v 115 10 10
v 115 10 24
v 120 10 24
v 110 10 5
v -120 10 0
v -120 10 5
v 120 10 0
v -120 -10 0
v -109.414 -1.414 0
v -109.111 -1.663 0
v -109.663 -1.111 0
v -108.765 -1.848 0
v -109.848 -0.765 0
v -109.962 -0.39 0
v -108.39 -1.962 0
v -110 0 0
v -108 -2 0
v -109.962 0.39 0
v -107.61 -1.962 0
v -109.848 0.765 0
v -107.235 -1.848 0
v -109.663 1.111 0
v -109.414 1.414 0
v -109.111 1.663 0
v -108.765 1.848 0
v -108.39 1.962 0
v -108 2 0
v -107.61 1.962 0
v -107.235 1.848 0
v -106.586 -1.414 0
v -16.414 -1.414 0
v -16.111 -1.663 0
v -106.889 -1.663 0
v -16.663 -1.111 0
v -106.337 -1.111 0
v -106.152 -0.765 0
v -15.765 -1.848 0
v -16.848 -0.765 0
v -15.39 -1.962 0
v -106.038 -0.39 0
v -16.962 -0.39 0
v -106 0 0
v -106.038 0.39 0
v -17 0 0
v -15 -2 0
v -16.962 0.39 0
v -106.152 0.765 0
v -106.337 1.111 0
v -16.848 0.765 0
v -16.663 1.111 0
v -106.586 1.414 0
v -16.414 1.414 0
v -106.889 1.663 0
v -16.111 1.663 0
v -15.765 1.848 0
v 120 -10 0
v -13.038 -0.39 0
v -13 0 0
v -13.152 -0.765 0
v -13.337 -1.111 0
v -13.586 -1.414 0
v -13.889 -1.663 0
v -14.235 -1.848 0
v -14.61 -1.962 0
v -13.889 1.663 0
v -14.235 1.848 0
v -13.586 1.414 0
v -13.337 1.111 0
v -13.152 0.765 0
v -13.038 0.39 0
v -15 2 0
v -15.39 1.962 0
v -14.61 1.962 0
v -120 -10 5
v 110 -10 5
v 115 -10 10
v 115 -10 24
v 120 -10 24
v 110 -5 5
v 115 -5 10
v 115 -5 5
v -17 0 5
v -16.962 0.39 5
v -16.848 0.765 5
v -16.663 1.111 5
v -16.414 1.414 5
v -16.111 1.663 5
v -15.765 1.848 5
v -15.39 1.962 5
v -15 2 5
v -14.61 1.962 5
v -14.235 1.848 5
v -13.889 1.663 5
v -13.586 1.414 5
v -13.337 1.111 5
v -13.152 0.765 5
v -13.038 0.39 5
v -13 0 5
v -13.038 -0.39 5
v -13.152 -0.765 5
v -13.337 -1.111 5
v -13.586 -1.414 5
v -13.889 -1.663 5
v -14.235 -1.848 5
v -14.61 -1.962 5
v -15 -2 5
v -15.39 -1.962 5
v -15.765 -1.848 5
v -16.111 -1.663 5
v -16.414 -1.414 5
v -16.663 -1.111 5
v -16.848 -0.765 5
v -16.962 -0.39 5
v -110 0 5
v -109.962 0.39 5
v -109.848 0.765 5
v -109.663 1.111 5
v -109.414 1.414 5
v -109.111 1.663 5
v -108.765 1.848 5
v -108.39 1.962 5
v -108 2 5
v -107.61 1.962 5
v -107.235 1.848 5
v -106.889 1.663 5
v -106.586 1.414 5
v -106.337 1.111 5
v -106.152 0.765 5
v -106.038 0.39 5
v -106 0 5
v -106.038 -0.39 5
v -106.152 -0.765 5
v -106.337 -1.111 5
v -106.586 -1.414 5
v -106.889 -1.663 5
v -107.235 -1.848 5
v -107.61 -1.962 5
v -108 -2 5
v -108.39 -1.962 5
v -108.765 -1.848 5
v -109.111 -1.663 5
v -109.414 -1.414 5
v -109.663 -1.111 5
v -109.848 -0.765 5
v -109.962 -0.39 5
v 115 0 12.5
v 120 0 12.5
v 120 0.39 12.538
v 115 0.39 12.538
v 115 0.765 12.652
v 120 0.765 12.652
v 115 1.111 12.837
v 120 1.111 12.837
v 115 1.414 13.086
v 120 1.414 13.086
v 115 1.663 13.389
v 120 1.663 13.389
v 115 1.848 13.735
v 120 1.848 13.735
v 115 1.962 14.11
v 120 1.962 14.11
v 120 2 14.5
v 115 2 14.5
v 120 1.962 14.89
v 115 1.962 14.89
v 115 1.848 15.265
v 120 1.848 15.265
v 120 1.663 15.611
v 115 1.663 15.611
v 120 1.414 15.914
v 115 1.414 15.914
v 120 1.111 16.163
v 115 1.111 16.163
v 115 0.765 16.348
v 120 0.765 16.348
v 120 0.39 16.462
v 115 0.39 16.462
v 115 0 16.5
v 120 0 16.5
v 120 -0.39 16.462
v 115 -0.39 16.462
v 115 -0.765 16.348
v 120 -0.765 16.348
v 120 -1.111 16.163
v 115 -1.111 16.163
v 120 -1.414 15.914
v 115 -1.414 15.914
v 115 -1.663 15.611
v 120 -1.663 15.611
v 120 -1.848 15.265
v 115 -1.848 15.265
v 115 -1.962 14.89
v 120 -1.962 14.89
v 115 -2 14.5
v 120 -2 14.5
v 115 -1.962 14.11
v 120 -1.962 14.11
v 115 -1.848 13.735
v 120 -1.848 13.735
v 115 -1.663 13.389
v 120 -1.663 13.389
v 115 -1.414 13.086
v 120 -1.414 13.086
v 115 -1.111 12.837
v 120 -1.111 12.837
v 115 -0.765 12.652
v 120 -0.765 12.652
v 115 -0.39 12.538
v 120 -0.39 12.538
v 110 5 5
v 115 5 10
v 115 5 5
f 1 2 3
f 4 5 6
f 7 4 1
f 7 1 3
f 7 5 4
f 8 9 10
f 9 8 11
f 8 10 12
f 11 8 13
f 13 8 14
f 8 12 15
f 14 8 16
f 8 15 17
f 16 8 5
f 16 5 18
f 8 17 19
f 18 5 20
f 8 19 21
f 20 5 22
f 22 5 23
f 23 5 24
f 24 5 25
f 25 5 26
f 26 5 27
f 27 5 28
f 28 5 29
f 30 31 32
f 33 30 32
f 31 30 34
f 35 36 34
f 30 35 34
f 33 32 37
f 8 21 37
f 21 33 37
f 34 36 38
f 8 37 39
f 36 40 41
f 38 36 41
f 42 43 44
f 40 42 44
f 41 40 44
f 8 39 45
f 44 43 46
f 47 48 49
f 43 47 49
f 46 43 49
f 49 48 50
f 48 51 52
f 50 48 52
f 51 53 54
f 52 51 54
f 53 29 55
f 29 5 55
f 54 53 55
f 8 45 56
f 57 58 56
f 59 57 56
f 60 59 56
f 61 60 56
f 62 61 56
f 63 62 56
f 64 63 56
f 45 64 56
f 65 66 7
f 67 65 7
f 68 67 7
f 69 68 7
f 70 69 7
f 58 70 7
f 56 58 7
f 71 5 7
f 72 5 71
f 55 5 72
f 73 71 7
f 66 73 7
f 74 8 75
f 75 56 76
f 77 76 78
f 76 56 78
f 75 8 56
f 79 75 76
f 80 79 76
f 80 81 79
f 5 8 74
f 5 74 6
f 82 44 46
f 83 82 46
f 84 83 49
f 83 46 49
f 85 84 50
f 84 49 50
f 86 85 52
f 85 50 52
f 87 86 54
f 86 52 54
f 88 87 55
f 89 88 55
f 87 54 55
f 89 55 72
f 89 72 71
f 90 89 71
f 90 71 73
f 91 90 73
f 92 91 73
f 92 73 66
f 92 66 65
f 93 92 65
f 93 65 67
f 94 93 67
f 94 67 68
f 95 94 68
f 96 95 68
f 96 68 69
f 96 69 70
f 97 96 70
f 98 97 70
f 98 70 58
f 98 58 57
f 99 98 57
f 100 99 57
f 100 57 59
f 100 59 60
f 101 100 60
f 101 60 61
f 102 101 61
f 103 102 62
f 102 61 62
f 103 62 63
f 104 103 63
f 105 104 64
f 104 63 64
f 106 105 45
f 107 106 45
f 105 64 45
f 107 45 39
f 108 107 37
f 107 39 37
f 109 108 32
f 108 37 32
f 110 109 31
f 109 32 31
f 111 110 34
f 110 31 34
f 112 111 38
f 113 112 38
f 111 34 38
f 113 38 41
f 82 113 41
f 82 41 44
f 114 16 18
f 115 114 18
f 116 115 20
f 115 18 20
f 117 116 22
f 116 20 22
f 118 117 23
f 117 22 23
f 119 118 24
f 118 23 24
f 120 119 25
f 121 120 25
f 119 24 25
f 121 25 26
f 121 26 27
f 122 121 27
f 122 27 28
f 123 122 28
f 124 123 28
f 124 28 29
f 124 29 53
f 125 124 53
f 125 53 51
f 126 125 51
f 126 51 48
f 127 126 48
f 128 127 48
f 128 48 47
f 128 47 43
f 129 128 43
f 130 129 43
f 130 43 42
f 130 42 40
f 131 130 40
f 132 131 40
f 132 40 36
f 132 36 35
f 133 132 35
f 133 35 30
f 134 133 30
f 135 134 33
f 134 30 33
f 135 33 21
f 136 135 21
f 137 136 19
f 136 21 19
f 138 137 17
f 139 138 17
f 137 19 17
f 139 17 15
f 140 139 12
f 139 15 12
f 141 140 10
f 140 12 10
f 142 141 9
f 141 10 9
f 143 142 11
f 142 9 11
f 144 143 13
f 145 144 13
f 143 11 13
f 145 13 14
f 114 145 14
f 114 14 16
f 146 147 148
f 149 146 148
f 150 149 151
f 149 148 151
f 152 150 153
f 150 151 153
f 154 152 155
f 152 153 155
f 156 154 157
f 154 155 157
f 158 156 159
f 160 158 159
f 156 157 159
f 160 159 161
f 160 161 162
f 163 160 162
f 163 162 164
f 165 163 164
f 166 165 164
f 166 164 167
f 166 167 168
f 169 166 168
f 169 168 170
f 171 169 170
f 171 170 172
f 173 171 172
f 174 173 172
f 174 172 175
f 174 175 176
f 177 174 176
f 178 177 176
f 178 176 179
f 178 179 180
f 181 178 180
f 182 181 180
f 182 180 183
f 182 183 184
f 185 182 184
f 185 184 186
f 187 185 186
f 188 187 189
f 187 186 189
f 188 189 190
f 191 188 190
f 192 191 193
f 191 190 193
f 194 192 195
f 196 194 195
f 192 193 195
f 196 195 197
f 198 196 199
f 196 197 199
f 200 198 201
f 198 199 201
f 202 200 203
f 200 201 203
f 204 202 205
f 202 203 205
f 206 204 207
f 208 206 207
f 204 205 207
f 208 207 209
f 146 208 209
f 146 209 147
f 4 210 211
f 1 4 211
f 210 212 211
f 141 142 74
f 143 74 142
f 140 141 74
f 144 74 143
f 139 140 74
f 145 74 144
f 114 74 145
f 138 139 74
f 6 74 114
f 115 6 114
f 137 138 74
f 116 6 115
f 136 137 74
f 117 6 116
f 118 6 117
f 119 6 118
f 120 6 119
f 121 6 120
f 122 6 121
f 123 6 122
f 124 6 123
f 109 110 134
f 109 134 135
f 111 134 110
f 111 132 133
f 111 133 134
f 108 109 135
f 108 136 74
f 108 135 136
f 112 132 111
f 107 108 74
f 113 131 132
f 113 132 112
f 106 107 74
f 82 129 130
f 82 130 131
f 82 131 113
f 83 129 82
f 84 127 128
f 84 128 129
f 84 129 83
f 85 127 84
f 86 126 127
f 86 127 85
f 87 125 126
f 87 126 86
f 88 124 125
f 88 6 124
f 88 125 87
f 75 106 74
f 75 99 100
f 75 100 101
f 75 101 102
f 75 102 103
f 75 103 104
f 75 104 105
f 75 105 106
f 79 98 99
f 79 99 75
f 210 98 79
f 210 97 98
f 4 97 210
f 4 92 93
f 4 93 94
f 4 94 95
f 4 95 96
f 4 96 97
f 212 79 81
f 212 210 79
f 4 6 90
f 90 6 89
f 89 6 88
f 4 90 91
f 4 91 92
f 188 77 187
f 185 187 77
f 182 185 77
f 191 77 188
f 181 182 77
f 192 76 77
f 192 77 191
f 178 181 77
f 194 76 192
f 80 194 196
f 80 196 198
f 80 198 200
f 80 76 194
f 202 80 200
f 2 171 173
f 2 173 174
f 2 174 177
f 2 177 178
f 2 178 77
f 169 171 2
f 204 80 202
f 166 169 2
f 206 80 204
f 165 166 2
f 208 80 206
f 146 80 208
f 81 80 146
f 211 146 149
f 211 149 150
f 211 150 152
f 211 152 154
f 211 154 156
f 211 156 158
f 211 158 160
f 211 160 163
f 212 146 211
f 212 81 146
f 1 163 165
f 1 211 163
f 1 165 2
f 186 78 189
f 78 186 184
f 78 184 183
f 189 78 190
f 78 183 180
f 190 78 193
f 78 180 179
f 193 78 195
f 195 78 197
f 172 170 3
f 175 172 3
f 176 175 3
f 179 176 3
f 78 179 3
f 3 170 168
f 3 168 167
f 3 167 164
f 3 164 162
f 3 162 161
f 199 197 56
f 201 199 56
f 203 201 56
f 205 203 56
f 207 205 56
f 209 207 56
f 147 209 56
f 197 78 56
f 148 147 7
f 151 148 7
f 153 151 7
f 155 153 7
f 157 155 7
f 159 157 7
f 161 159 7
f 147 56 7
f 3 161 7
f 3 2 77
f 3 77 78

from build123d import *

# Parameters (mm, degrees)
SKETCH1_W           = 240
SKETCH1_H           = 20
BOSS_EXTRUDE1_DEPTH = 5
SKETCH2_W           = 5
SKETCH2_H           = 20
BOSS_EXTRUDE2_DEPTH = 19
SKETCH3_R           = 2
CUT_EXTRUDE1_DEPTH  = 242.404225315
SKETCH4_W           = 5
SKETCH4_H           = 5
BOSS_EXTRUDE3_DEPTH = 5
CUT_EXTRUDE2_DEPTH  = 125
SKETCH6_R           = 2
CUT_EXTRUDE3_DEPTH  = 123.784363825
SKETCH7_R           = 2
CUT_EXTRUDE4_DEPTH  = 10


with BuildPart() as part:
    # Sketch1 → Boss-Extrude1 (new body)
    with BuildSketch(Plane.XY):
        Rectangle(SKETCH1_W, SKETCH1_H)
    extrude(amount=BOSS_EXTRUDE1_DEPTH)

    # Sketch2 → Boss-Extrude2 (add)
    with BuildSketch(Plane.XY.offset(5)):
        with Locations((117.5, 0)):
            Rectangle(SKETCH2_W, SKETCH2_H)
    extrude(amount=BOSS_EXTRUDE2_DEPTH)

    # Sketch3 → Cut-Extrude1 (cut, through all)
    with BuildSketch(Plane(origin=(120, 0, 0), x_dir=(0, 0, -1), z_dir=(1, 0, 0))):
        with Locations((-14.5, 0)):
            Circle(SKETCH3_R)
    extrude(amount=-CUT_EXTRUDE1_DEPTH, mode=Mode.SUBTRACT)

    # Sketch4 → Boss-Extrude3 (add)
    with BuildSketch(Plane.ZY.offset(-115)):
        with Locations((7.5, -7.5)):
            Rectangle(SKETCH4_W, SKETCH4_H)
        with Locations((7.5, 7.5)):
            Rectangle(SKETCH4_W, SKETCH4_H)
    extrude(amount=BOSS_EXTRUDE3_DEPTH)

    # Sketch5 → Cut-Extrude2 (cut, through all)
    with BuildSketch(Plane.XZ.offset(10)):
        Polygon((110, 5), (115, 10), (110, 10), align=None)
    extrude(amount=-CUT_EXTRUDE2_DEPTH, mode=Mode.SUBTRACT)

    # Sketch6 → Cut-Extrude3 (cut, through all)
    with BuildSketch(Plane(origin=(0, 0, 0), x_dir=(-1, 0, 0), z_dir=(0, 0, -1))):
        with Locations((108, 0)):
            Circle(SKETCH6_R)
    extrude(amount=-CUT_EXTRUDE3_DEPTH, mode=Mode.SUBTRACT)

    # Sketch7 → Cut-Extrude4 (cut)
    with BuildSketch(Plane(origin=(0, 0, 0), x_dir=(-1, 0, 0), z_dir=(0, 0, -1))):
        with Locations((15, 0)):
            Circle(SKETCH7_R)
    extrude(amount=-CUT_EXTRUDE4_DEPTH, mode=Mode.SUBTRACT)


solid = part.part
